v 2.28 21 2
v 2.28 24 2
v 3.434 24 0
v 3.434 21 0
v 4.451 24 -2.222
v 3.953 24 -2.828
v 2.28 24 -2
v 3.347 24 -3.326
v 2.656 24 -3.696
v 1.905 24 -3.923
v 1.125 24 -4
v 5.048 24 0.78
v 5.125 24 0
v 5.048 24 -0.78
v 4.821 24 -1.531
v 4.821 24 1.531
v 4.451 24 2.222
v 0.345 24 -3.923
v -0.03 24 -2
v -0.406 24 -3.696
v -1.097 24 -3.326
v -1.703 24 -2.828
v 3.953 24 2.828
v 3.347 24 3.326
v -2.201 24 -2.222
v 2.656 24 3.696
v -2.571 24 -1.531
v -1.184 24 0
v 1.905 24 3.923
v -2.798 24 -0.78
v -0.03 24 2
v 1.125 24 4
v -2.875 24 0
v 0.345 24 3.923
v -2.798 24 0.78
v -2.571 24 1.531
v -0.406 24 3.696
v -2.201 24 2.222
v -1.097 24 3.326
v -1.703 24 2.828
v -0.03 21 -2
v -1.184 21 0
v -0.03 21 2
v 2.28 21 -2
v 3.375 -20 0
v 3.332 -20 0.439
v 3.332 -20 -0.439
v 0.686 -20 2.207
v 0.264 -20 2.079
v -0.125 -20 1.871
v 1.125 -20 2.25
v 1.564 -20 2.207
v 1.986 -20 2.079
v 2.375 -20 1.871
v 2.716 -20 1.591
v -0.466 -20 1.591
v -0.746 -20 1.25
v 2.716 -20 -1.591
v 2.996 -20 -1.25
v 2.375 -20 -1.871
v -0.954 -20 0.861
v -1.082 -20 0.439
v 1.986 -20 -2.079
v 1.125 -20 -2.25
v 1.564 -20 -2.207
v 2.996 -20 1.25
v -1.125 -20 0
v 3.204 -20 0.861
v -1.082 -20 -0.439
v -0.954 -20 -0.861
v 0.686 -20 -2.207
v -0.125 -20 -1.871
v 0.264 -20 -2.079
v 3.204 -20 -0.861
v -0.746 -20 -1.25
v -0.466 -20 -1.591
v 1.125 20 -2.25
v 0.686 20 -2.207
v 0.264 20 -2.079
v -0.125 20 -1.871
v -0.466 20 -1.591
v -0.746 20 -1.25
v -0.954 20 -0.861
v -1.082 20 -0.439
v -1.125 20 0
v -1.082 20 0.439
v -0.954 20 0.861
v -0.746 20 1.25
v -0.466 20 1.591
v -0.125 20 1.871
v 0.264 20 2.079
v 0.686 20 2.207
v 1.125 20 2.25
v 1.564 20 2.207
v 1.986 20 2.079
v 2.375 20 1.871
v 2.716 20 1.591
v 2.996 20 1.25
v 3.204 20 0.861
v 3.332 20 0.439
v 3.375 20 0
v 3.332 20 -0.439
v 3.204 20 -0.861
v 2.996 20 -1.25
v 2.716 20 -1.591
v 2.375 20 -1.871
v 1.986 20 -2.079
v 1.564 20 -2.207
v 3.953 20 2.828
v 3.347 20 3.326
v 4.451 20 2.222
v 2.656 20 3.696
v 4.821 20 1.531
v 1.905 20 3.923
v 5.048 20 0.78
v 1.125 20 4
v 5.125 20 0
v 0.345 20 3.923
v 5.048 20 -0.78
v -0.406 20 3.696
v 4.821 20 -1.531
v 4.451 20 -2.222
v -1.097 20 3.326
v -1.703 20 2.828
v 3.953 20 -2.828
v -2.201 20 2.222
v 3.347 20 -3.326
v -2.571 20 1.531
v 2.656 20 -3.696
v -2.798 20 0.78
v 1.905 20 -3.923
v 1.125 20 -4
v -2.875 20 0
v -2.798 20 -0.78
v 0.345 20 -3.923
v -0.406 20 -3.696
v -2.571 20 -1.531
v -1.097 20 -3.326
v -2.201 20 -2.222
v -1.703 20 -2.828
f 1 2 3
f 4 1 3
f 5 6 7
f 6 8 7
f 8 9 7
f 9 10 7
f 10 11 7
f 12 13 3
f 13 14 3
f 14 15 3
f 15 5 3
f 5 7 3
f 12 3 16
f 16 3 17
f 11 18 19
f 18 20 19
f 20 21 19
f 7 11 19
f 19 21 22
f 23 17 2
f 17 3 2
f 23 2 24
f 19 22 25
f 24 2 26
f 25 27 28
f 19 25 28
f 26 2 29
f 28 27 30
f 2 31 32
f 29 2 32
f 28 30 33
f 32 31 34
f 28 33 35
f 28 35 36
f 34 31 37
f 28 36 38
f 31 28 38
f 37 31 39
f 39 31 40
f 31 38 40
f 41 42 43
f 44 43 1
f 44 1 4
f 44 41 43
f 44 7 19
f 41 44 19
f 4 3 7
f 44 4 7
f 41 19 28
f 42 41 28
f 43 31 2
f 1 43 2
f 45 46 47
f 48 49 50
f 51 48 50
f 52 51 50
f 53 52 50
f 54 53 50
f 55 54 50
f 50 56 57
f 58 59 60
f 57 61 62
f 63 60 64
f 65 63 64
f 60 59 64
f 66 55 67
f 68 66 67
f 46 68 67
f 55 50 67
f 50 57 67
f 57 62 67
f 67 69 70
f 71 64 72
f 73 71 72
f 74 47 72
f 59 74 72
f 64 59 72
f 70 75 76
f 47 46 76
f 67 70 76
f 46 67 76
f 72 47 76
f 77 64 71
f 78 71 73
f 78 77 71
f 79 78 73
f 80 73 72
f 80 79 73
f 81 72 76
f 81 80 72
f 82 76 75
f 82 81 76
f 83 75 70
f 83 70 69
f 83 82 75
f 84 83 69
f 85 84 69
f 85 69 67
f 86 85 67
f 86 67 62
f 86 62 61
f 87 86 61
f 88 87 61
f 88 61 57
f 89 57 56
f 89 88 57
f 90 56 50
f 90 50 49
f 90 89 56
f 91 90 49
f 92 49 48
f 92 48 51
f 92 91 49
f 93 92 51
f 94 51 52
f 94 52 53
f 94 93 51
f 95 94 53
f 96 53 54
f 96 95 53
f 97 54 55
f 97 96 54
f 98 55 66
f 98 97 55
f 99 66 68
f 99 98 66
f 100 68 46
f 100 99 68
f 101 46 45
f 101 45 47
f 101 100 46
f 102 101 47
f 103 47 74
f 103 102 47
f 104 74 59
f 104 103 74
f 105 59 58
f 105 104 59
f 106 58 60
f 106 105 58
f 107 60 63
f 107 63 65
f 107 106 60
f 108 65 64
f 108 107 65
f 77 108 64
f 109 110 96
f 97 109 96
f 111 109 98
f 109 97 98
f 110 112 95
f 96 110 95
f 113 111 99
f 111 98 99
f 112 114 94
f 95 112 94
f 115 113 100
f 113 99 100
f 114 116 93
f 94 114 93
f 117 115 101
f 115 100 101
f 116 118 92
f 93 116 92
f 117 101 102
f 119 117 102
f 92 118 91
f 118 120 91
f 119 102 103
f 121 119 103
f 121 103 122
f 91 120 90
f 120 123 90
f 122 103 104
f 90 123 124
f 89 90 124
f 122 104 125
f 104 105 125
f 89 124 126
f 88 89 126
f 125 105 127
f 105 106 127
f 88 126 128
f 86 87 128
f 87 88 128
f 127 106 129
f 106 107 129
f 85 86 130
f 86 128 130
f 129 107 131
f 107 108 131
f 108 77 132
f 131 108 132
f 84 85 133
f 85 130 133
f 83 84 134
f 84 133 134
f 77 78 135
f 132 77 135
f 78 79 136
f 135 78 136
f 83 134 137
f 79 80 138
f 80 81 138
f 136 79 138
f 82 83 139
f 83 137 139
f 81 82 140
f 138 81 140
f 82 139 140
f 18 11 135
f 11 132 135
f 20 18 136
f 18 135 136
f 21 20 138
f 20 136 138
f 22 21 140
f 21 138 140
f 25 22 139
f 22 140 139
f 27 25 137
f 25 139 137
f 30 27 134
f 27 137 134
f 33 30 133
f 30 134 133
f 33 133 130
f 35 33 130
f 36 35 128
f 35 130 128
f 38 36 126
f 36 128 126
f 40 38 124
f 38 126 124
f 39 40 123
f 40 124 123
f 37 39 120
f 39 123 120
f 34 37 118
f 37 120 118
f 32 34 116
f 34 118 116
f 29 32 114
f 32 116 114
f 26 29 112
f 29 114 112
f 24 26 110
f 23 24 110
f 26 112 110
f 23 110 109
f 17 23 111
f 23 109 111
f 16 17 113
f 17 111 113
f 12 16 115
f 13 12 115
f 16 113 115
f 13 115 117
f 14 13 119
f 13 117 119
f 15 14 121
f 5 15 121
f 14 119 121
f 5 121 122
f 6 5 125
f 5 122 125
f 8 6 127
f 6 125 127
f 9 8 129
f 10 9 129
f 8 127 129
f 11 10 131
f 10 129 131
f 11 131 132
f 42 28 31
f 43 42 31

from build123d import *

# Parameters (mm, degrees)
ESQUISSE1_W             = 2.25
ESQUISSE1_H             = 40
ENL_V_MAT_EXTRU_1_DEPTH = 3


with BuildPart() as part:
    # Esquisse1 → Révolution1 (revolve)
    with BuildSketch(Plane.XY, mode=Mode.PRIVATE) as r_volution1_sk:
        Rectangle(ESQUISSE1_W, ESQUISSE1_H)
        Polygon((-2.875, 20), (-1.125, 20), (1.125, 20), (1.125, 24), (-2.875, 24), align=None)
    revolve(r_volution1_sk.sketch.rotate(Axis((1.125, -20, 0), (0, 1, 0)), 270), axis=Axis((1.125, -20, 0), (0, 1, 0)))

    # Esquisse2 → Enlèv. mat.-Extru.1 (cut)
    with BuildSketch(Plane(origin=(0, 24, 0), x_dir=(1, 0, 0), z_dir=(0, 1, 0))):
        Polygon((3.434401077, 0), (2.279700538, 2), (-0.029700538, 2), (-1.184401077, 0), (-0.029700538, -2), (2.279700538, -2), align=None)
    extrude(amount=-ENL_V_MAT_EXTRU_1_DEPTH, mode=Mode.SUBTRACT)


solid = part.part
